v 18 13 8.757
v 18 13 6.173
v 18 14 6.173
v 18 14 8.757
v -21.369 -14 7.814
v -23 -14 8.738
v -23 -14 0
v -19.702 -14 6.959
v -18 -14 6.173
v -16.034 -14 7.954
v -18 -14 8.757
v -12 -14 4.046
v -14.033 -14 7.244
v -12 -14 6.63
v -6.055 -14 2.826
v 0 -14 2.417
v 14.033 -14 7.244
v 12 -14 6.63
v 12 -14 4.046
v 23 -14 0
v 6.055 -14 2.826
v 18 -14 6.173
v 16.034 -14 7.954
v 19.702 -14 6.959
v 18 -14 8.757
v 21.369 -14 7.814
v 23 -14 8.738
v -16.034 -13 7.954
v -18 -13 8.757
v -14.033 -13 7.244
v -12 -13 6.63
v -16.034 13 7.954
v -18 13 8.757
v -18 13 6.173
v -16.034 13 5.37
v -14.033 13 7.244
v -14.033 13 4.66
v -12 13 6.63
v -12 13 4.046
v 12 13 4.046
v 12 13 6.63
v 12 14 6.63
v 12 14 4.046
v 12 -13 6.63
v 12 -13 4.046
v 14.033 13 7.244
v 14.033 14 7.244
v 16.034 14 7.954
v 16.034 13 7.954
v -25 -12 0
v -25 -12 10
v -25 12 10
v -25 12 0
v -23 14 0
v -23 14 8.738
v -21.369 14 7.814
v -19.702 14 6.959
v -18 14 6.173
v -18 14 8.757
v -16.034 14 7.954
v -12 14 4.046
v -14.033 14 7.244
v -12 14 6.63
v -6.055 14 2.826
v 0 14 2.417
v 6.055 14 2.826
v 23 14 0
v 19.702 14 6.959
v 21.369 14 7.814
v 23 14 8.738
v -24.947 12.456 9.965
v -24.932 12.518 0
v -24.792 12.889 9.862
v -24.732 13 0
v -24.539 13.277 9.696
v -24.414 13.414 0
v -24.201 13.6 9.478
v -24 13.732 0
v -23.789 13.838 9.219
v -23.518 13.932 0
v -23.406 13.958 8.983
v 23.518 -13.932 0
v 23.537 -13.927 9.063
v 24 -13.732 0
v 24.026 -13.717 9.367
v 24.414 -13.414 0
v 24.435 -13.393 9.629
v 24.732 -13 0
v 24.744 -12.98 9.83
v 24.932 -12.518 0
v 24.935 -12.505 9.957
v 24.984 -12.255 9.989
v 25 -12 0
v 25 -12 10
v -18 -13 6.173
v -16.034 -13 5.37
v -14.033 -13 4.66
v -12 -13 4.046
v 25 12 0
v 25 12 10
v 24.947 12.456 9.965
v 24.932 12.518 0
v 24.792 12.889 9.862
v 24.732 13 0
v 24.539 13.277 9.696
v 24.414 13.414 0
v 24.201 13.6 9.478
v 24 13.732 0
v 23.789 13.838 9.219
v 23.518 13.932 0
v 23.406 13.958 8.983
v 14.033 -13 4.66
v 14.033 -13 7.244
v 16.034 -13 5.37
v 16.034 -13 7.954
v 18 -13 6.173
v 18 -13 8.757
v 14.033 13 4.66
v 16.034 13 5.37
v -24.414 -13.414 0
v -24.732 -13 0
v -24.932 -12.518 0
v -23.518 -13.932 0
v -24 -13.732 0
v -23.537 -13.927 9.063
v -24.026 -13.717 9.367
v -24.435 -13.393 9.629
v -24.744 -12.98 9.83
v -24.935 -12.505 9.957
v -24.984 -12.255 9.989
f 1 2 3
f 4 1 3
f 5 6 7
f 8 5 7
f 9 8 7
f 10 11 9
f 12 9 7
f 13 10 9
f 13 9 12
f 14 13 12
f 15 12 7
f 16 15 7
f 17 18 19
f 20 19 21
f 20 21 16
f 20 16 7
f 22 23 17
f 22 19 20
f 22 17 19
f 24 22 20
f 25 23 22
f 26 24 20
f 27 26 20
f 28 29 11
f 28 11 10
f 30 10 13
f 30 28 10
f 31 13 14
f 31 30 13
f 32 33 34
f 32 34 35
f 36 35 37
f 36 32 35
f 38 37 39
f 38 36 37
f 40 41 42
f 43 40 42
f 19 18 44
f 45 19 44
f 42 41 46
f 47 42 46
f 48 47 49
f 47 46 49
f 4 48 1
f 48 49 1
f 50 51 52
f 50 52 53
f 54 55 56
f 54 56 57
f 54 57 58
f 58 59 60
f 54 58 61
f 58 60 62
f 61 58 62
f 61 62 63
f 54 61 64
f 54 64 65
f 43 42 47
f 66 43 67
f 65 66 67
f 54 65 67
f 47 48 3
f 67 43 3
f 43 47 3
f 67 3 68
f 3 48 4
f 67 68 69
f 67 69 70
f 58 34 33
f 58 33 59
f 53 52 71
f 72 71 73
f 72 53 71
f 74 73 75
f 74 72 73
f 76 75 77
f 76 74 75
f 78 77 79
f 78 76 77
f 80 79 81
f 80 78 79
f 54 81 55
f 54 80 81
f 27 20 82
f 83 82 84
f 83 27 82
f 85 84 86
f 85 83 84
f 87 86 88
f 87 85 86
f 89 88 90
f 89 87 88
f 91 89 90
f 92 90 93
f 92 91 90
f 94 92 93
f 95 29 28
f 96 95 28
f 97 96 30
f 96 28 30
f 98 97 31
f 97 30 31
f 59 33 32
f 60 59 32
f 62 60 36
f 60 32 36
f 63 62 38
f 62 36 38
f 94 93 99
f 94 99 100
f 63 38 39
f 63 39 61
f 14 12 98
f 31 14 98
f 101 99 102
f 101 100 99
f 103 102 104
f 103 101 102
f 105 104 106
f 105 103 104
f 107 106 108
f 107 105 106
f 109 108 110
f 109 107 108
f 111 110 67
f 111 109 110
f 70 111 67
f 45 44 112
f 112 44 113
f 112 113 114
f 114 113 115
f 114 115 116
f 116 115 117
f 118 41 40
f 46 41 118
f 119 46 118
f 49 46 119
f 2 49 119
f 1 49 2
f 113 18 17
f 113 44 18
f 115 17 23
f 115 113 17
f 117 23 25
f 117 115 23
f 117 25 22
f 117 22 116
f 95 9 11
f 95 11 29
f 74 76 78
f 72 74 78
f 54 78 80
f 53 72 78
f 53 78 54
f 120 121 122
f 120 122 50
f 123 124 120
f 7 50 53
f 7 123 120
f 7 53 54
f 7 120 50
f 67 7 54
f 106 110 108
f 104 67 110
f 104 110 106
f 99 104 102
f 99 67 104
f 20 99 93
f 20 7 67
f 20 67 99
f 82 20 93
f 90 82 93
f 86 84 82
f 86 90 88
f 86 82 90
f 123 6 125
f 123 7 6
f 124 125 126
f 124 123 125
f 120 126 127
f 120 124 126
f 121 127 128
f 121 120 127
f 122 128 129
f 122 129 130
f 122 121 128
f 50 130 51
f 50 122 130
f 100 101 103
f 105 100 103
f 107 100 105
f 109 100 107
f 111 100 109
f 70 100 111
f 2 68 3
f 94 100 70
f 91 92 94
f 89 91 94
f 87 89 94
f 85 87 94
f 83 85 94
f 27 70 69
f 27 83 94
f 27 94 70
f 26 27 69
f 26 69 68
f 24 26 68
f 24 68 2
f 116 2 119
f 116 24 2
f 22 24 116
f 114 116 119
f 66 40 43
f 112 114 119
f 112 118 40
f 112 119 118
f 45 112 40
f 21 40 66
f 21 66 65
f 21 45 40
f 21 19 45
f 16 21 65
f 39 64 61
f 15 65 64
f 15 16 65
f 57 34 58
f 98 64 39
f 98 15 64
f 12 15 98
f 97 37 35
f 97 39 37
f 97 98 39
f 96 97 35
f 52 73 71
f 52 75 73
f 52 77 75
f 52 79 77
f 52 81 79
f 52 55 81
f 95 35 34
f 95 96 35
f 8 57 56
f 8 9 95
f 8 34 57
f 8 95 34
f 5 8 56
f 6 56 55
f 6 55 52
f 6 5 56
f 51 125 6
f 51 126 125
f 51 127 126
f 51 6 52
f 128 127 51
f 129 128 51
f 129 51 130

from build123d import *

# Parameters (mm, degrees)
F1_DEPTH      = 14
F1_DEPTH_BACK = 14
F3_W          = 6
F3_H          = 1
F4_DEPTH      = 10
F5_R          = 45
F6_DEPTH      = 25
F6_DEPTH_BACK = 25
F7_R          = 2


with BuildPart() as f1:
    # F0 (on Front) → F1 (new body, two sides)
    with BuildSketch(Plane.XZ) as f1_sk:
        with BuildLine():
            Line((-25, 10), (-25, 0))
            Line((-25, 0), (25, 0))
            Line((25, 0), (25, 10))
            ThreePointArc((25, 10), (0, 2.416574), (-25, 10))
        make_face()
    extrude(amount=F1_DEPTH)
    extrude(f1_sk.sketch, amount=-F1_DEPTH_BACK)

    # F3 (on offset) → F4 (join)
    with BuildSketch(Plane.XY.offset(10)):
        with Locations((-15, -13.5)):
            Rectangle(F3_W, F3_H)
        with Locations((-15, 13.5)):
            Rectangle(F3_W, F3_H)
        with Locations((15, -13.5)):
            Rectangle(F3_W, F3_H)
        with Locations((15, 13.5)):
            Rectangle(F3_W, F3_H)
    extrude(amount=-F4_DEPTH)

    # F5 (on Front) → F6 (cut, two sides)
    with BuildSketch(Plane.XZ) as f6_sk:
        with Locations((0, 50)):
            Circle(F5_R)
    extrude(amount=F6_DEPTH, mode=Mode.SUBTRACT)
    extrude(f6_sk.sketch, amount=-F6_DEPTH_BACK, mode=Mode.SUBTRACT)

    # F7
    f7_edges = [f1.edges().sort_by_distance(p)[0] for p in [
        (-25, 14, 5),
        (-25, -14, 5),
        (25, -14, 5),
        (25, 14, 5),
    ]]
    fillet(f7_edges, radius=F7_R)


solid = f1.part
